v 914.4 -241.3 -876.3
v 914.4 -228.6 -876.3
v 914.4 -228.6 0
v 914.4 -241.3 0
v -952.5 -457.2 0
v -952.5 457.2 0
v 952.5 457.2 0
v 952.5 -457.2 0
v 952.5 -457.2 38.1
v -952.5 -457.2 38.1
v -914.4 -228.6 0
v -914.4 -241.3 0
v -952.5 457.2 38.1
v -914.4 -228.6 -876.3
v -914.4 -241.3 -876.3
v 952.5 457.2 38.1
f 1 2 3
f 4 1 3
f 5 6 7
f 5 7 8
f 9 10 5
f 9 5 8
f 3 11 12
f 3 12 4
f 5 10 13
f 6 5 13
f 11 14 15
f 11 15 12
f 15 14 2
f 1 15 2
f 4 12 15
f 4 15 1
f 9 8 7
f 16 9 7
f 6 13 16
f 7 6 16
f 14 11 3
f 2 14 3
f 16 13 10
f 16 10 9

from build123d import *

# Parameters (mm, degrees)
F0_W     = 38.1
F0_H     = 914.4
F0_W_2   = 1828.8
F1_DEPTH = 38.1
F2_DEPTH = 876.3
F4_W     = 1828.8
F4_H     = 876.3
F5_DEPTH = 12.7
F6_W     = 914.4
F6_H     = 876.3
F7_DEPTH = 38.1
F8_W     = 914.4
F8_H     = 876.3
F9_DEPTH = 38.1


with BuildPart() as f1:
    # F0 (on Top) → F1 (new body)
    with BuildSketch(Plane.XY):
        with Locations((-933.45, 0)):
            Rectangle(F0_W, F0_H)
        Rectangle(F0_W_2, F0_H)
        with Locations((933.45, 0)):
            Rectangle(F0_W, F0_H)
    extrude(amount=F1_DEPTH)

    # F0 (on Top) → F2 (join)
    with BuildSketch(Plane.XY):
        with Locations((-933.45, 0)):
            Rectangle(F0_W, F0_H)
        with Locations((933.45, 0)):
            Rectangle(F0_W, F0_H)
    extrude(amount=-F2_DEPTH)

    # F6 (on face) → F7 (cut)
    with BuildSketch(Plane.YZ.offset(952.5)):
        with Locations((0, -438.15)):
            Rectangle(F6_W, F6_H)
    extrude(amount=-F7_DEPTH, mode=Mode.SUBTRACT)

    # F8 (on face) → F9 (cut)
    with BuildSketch(Plane(origin=(-952.5, 0, 0), x_dir=(0, -1, 0), z_dir=(-1, 0, 0))):
        with Locations((0, -438.15)):
            Rectangle(F8_W, F8_H)
    extrude(amount=-F9_DEPTH, mode=Mode.SUBTRACT)


with BuildPart() as f5:
    # F4 (on offset) → F5 (new body)
    with BuildSketch(Plane.XZ.offset(228.6)):
        with Locations((0, -438.15)):
            Rectangle(F4_W, F4_H)
    extrude(amount=F5_DEPTH)


solid = Compound([f1.part, f5.part])
